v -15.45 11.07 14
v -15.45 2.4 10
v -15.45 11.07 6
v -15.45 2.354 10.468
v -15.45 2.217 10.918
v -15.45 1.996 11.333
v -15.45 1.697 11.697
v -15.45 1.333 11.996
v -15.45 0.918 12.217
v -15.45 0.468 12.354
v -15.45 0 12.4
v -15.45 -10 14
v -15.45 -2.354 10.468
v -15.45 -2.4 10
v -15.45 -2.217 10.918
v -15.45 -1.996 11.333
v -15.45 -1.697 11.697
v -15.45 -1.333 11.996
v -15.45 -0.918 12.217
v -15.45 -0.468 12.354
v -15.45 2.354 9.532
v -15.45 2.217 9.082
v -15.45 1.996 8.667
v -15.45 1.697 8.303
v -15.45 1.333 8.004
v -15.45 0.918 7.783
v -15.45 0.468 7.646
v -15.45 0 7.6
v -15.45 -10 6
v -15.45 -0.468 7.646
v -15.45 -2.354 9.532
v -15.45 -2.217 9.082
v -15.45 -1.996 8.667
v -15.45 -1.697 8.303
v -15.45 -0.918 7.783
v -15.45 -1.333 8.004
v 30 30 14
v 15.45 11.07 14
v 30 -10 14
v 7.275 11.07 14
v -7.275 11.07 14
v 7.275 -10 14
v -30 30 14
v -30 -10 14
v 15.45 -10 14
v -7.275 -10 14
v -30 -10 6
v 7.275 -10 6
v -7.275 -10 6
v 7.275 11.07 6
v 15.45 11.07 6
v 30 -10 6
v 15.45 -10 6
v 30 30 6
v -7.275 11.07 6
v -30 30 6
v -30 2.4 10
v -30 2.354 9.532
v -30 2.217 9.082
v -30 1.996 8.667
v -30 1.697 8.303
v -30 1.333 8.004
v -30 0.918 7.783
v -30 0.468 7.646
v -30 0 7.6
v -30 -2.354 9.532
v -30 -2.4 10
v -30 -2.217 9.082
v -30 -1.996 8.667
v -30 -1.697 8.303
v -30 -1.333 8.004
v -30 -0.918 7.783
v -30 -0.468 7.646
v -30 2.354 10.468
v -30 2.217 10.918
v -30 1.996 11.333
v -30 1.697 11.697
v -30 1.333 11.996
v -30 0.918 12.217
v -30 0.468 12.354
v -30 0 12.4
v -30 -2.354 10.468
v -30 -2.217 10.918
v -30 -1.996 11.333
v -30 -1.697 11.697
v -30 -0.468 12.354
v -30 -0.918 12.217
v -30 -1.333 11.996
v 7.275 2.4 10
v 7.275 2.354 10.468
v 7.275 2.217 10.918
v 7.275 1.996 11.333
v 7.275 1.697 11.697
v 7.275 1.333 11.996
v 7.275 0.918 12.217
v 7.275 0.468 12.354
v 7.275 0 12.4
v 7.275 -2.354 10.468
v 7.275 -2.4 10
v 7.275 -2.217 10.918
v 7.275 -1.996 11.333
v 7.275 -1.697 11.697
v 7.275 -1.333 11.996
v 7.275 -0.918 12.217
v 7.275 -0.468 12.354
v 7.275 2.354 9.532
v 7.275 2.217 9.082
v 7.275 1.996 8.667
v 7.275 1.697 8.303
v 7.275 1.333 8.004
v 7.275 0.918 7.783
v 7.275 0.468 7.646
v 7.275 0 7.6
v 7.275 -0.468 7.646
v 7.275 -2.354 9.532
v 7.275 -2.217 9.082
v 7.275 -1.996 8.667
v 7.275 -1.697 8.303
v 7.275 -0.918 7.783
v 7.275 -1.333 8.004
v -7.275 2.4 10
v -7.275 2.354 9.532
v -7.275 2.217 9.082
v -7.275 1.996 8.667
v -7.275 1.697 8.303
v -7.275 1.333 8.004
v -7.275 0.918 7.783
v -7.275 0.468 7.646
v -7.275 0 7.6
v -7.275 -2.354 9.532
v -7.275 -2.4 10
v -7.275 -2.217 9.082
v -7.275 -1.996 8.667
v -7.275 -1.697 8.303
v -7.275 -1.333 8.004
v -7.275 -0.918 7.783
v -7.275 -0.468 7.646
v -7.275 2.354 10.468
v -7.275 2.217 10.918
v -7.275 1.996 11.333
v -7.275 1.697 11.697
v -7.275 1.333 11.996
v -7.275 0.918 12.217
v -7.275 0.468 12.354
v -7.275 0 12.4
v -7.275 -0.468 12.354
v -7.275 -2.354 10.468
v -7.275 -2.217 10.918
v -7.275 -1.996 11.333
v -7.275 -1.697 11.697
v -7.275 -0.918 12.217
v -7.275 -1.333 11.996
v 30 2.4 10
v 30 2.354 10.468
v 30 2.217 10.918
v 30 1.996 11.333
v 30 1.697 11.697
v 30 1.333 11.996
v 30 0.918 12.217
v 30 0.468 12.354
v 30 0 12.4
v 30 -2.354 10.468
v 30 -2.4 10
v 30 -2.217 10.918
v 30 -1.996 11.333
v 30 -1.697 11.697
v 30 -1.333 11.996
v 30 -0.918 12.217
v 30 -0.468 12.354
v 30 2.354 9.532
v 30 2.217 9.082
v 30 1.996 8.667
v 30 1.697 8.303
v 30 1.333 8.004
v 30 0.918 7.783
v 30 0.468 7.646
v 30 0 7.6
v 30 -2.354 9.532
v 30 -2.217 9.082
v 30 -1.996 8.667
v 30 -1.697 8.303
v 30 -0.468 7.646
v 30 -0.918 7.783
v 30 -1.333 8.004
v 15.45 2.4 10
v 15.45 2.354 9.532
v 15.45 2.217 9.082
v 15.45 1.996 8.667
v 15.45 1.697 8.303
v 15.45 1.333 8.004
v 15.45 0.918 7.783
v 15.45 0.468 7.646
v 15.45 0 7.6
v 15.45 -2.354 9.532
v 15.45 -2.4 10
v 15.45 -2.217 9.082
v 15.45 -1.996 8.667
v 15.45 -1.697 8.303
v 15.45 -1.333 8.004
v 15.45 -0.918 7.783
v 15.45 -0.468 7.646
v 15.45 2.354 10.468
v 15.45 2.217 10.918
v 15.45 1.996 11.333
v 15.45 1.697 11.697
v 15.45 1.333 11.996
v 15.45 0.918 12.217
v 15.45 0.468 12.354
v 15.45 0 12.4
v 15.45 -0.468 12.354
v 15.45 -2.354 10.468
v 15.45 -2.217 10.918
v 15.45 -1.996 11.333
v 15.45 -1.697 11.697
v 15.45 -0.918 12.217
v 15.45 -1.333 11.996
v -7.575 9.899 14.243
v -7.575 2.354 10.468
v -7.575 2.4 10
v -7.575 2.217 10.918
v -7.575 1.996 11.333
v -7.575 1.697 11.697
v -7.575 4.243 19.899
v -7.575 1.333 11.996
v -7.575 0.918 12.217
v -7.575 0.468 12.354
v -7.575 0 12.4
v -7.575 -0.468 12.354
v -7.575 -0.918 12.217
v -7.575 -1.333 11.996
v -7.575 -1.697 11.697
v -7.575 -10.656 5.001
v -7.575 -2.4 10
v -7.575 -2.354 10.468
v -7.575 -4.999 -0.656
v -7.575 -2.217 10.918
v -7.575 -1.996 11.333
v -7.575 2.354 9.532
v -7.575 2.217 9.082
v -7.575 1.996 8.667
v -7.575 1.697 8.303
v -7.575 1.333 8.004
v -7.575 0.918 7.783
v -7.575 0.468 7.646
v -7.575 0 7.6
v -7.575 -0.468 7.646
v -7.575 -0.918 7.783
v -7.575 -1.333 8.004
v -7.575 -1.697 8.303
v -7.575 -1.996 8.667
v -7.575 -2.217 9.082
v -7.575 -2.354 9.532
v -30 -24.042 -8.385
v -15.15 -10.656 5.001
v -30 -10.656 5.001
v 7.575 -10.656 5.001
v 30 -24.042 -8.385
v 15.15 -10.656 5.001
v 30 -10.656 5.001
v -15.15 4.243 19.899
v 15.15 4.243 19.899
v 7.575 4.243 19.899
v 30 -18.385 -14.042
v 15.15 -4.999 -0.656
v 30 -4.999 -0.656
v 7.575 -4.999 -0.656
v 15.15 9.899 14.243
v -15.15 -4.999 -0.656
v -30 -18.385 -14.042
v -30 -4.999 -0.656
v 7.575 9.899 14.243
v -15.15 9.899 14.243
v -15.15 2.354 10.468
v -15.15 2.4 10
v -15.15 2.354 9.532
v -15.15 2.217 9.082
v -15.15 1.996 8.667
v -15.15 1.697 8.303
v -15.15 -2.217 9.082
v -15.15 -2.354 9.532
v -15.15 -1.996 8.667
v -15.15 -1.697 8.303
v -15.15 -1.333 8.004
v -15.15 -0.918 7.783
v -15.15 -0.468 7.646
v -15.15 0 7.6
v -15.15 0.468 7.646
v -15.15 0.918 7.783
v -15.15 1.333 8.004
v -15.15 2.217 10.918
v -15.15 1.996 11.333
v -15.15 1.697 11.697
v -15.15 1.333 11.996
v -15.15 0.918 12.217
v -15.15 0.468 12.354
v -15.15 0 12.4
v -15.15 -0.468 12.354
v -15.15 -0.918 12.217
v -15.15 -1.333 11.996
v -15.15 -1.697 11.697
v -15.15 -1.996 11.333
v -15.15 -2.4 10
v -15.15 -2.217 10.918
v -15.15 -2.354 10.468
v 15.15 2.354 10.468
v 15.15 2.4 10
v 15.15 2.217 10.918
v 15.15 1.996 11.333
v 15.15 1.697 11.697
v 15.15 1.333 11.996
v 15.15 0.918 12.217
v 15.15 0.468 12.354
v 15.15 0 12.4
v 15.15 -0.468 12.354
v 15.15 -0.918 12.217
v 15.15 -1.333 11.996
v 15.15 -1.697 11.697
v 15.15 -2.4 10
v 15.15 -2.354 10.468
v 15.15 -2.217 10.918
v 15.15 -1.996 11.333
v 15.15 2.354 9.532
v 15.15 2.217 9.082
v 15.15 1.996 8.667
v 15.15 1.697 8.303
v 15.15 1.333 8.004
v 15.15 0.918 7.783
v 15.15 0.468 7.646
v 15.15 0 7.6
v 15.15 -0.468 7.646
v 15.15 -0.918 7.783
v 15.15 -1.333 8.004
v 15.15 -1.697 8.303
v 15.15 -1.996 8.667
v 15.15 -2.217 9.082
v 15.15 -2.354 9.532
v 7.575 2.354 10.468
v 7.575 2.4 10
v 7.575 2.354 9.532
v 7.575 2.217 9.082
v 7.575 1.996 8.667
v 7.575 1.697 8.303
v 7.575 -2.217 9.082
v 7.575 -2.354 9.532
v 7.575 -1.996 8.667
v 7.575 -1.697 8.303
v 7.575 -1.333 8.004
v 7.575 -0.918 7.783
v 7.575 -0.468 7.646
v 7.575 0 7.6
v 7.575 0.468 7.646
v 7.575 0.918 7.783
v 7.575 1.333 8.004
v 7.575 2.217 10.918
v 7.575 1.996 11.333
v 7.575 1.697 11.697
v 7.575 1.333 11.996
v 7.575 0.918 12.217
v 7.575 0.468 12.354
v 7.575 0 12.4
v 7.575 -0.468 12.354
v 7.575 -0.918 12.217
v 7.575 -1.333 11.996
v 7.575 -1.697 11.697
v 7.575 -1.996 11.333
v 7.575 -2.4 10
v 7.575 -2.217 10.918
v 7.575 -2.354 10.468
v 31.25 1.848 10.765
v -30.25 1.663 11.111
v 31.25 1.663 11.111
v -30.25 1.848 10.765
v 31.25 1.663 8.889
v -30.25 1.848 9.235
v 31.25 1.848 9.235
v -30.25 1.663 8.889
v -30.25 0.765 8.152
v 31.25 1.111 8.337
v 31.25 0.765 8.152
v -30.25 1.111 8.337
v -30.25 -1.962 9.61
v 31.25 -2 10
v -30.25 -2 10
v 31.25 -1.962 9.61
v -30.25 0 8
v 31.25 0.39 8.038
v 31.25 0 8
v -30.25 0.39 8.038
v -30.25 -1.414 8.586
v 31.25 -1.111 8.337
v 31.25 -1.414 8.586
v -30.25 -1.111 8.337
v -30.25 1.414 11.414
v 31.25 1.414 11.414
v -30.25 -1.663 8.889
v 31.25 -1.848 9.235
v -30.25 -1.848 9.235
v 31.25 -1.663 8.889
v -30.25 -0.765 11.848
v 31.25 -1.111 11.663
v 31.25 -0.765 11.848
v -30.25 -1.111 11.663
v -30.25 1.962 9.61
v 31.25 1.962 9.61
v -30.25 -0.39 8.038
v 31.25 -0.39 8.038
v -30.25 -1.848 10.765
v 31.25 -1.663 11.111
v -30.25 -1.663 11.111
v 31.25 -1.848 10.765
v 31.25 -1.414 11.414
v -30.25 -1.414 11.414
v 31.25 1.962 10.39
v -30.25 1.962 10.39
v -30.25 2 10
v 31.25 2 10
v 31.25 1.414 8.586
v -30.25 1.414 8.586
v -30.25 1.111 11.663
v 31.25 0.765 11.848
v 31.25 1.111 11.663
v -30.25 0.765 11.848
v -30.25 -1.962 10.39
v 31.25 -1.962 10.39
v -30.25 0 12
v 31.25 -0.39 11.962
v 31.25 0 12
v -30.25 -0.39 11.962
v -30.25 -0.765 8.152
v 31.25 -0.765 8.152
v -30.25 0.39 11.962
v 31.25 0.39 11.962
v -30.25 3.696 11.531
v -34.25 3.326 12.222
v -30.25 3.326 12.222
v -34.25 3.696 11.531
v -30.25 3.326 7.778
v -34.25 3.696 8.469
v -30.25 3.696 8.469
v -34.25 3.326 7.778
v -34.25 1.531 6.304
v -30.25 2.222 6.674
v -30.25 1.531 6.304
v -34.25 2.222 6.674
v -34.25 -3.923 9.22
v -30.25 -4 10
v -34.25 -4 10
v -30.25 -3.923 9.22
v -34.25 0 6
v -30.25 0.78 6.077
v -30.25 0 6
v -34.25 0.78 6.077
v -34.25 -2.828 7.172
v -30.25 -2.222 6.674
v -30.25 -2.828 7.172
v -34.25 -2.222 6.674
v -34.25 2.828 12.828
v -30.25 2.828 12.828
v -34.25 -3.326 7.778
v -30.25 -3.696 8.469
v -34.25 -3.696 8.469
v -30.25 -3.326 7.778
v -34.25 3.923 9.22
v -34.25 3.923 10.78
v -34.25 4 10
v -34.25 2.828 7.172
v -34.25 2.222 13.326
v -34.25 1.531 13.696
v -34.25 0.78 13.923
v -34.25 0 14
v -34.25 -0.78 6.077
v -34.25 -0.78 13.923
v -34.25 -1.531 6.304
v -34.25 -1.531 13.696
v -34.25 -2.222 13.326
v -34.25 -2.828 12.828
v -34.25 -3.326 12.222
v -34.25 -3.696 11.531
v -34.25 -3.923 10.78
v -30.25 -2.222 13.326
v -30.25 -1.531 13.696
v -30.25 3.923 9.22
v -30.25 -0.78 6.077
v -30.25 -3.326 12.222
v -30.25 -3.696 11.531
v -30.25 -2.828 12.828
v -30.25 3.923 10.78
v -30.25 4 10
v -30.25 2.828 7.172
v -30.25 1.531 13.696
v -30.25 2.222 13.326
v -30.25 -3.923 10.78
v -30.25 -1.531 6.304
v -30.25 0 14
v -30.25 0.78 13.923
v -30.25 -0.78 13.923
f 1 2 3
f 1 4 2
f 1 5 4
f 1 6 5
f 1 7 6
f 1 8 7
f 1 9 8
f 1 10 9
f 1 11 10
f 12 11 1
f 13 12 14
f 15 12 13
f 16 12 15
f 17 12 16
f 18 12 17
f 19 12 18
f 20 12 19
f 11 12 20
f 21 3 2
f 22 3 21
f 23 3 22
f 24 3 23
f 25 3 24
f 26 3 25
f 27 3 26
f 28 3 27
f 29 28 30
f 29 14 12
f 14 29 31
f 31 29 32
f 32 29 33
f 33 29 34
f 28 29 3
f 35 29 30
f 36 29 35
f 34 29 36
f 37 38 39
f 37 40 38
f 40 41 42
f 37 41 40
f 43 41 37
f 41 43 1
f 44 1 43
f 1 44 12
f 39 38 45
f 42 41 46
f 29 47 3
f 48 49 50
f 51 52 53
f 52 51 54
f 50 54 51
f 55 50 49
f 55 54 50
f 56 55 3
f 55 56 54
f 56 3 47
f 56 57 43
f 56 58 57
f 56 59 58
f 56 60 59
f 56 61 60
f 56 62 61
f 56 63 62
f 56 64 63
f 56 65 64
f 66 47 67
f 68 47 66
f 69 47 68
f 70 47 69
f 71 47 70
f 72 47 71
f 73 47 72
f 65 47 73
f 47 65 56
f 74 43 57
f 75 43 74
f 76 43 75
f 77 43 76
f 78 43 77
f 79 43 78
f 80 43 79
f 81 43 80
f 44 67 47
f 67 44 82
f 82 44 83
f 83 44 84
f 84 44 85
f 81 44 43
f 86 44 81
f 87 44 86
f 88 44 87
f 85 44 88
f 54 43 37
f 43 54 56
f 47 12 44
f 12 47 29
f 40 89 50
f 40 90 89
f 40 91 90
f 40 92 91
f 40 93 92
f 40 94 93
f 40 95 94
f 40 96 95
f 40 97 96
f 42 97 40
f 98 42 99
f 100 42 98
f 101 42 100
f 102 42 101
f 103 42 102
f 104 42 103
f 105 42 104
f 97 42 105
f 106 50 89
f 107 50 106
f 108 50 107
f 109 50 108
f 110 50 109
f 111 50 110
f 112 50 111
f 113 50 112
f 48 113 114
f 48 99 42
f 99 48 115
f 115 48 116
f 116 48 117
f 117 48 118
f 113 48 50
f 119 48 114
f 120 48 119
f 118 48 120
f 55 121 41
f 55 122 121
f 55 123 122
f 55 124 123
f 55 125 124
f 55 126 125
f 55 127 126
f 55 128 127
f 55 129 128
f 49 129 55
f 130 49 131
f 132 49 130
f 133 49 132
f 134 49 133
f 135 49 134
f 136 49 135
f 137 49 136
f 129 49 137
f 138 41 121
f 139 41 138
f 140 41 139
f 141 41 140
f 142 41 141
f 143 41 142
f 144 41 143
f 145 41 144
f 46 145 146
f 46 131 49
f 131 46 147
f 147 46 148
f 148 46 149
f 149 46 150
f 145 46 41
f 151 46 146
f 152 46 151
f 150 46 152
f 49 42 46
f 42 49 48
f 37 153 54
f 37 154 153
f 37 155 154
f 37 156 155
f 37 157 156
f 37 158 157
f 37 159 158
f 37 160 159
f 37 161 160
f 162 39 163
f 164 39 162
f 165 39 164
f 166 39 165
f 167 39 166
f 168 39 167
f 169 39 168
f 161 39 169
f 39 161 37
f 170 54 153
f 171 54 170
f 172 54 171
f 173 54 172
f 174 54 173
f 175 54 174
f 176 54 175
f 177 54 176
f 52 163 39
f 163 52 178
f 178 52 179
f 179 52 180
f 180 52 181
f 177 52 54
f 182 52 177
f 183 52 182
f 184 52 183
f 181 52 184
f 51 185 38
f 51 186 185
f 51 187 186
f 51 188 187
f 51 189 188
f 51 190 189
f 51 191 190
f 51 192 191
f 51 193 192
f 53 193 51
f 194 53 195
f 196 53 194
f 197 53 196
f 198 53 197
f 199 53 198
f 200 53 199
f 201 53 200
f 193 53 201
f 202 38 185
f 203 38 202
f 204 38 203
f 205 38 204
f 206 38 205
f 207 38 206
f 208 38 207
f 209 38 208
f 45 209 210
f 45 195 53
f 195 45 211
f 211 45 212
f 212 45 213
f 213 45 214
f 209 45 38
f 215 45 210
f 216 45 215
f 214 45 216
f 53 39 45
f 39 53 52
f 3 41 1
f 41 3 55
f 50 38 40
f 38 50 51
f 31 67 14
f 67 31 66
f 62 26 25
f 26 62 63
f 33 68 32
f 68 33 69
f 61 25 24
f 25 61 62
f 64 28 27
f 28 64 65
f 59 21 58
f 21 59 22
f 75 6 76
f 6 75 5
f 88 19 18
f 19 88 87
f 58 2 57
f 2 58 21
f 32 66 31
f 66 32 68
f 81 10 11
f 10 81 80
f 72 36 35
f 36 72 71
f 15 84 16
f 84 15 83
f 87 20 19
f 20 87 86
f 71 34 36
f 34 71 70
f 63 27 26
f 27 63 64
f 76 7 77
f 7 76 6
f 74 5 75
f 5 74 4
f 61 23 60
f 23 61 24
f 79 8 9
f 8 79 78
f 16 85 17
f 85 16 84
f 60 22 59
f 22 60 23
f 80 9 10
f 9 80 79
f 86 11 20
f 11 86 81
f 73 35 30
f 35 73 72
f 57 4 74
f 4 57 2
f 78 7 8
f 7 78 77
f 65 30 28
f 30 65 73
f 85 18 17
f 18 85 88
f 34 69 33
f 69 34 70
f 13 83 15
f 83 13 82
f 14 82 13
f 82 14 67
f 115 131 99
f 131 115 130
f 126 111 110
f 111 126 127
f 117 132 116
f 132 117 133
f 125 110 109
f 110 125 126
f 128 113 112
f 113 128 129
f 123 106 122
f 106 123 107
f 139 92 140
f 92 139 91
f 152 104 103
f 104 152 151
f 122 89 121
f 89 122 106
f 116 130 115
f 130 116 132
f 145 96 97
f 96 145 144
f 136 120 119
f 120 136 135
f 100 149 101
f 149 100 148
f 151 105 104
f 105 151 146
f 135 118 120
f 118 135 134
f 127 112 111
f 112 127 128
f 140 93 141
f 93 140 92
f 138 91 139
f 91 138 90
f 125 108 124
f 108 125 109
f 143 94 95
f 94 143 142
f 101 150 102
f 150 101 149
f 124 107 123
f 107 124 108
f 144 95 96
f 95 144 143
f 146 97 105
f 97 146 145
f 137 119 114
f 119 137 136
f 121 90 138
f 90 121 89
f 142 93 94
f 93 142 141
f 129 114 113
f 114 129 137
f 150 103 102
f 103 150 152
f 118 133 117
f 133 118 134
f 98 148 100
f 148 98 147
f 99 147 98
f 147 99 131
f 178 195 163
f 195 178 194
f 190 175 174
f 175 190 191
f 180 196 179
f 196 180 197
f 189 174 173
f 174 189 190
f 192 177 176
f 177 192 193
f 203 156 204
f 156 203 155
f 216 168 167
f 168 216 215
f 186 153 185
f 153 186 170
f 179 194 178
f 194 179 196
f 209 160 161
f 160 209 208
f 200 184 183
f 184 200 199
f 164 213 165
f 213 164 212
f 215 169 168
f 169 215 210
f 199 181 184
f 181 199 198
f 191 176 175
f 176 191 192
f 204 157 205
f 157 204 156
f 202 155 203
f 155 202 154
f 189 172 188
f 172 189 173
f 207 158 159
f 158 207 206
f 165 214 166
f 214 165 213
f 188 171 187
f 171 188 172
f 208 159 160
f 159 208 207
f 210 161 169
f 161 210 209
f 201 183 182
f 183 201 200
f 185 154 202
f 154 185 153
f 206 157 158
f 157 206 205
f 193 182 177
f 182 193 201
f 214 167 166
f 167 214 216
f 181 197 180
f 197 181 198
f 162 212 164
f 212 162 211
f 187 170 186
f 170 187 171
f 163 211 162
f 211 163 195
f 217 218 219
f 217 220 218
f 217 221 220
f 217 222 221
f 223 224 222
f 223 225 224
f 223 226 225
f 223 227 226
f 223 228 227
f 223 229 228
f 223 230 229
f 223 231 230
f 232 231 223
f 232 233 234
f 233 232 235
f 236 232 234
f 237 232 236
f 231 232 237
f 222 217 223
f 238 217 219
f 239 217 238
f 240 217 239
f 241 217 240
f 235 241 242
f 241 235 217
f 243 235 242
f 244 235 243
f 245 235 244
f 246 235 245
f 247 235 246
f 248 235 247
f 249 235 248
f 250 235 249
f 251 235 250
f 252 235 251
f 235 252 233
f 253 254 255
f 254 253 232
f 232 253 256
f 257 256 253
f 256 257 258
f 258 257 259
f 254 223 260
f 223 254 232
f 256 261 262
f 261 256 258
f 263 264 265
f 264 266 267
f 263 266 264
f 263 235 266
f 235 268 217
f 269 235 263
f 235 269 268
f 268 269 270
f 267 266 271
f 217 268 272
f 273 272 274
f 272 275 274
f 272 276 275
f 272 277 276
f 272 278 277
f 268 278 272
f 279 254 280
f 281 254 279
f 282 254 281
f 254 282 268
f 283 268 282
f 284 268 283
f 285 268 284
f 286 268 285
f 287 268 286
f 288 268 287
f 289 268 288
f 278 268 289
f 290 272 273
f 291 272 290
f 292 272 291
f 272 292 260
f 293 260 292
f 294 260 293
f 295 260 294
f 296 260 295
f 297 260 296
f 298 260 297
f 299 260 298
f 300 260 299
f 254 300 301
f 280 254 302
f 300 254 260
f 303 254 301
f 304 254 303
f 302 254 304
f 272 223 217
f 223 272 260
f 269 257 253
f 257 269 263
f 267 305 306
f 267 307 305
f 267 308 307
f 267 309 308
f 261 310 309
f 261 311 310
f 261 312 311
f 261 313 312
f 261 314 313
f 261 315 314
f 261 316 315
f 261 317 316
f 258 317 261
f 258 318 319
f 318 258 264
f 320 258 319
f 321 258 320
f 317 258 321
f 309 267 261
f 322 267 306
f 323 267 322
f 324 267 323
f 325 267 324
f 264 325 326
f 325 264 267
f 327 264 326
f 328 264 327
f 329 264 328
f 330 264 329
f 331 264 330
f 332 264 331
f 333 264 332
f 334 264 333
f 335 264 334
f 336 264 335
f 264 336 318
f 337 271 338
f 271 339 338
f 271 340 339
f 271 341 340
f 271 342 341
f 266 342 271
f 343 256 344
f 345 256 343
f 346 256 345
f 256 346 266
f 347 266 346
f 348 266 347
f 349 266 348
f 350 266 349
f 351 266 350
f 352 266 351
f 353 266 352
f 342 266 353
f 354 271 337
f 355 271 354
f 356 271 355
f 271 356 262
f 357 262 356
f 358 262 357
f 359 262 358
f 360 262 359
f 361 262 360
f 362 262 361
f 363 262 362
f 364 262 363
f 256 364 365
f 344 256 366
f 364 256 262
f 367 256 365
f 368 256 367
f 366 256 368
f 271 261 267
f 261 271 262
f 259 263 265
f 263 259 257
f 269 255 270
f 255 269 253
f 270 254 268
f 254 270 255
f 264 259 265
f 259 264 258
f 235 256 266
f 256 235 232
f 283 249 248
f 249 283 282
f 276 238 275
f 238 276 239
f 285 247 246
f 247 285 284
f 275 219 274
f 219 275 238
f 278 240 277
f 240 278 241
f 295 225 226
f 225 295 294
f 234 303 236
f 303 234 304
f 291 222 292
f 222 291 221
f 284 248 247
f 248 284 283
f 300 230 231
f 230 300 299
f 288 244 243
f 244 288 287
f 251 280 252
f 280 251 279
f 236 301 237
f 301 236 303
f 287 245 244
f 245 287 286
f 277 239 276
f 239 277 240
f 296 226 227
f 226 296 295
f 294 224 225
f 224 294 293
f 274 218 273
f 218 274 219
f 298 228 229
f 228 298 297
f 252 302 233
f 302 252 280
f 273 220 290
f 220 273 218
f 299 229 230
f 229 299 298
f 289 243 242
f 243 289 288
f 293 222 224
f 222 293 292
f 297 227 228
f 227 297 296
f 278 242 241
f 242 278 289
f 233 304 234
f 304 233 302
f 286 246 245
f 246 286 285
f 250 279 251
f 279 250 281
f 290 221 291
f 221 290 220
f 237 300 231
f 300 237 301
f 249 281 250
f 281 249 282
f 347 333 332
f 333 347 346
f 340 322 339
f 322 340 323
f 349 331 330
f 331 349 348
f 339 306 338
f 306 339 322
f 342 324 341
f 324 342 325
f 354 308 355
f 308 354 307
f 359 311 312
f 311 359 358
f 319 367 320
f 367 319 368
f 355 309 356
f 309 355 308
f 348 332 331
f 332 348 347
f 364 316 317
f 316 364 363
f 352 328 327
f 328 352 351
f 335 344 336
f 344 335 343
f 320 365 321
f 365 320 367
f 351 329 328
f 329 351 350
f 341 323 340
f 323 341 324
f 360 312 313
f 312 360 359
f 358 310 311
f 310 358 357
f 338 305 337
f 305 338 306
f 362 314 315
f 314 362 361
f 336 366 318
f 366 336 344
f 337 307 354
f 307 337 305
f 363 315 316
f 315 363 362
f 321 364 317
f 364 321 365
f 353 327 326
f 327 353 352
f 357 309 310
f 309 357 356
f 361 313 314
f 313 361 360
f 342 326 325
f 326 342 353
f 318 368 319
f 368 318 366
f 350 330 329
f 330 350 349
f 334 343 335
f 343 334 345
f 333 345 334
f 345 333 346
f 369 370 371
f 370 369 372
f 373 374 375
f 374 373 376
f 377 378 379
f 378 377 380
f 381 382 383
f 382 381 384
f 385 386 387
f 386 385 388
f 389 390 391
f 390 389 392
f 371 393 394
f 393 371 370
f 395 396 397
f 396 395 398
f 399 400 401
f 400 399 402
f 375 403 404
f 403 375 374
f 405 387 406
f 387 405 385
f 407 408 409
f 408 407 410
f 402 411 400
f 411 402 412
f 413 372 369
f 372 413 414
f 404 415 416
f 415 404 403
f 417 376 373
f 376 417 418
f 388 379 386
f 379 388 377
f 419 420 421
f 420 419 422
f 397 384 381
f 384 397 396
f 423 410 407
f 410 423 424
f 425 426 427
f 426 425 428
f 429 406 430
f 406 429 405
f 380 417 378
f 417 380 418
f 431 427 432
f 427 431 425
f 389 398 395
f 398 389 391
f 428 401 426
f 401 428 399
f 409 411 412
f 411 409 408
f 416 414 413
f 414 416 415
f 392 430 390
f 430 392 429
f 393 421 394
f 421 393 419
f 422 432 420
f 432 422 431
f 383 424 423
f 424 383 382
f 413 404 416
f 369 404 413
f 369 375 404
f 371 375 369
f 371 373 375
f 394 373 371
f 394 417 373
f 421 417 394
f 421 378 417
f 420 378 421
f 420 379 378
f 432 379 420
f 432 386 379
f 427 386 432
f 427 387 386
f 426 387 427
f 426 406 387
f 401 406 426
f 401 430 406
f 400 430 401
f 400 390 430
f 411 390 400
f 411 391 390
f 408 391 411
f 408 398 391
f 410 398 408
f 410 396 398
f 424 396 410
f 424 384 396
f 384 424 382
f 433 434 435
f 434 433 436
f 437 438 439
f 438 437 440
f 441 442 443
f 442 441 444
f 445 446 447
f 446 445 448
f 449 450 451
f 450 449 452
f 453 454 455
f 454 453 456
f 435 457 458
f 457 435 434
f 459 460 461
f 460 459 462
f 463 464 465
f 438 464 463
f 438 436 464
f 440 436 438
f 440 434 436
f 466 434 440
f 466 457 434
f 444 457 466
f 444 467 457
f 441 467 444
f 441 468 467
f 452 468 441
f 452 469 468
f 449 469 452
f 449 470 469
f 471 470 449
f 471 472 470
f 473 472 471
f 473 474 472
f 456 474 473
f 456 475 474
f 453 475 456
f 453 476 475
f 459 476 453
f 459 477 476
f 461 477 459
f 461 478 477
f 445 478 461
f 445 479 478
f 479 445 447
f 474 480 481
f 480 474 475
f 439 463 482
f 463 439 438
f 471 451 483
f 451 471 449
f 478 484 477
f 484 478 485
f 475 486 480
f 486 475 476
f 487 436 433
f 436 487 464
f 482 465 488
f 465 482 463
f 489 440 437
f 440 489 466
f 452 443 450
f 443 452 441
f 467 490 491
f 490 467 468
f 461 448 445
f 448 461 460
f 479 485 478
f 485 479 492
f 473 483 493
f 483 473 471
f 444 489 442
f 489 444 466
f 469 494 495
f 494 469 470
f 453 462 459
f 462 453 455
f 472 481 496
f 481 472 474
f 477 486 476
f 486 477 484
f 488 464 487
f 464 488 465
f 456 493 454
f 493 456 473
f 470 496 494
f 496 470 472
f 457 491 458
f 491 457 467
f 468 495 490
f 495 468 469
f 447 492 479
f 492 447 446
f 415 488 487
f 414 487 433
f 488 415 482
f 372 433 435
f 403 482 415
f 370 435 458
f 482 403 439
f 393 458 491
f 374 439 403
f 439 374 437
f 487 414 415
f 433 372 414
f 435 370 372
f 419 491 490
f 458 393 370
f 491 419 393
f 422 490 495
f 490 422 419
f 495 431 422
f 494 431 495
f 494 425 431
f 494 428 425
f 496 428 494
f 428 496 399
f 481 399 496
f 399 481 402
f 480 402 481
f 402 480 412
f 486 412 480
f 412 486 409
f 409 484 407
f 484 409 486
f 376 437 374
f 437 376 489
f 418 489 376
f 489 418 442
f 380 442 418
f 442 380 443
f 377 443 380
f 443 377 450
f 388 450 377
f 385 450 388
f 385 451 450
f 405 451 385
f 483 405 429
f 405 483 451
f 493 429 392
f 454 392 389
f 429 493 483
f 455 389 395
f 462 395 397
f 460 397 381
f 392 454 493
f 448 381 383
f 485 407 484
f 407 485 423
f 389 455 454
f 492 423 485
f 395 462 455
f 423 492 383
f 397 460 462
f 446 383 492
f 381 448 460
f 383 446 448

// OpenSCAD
$fn = 32;

// ------------------------------------------------------------------------
// Butt hinge: hinge 60 mm, leaf swung 45 deg
// Every part is its own module, assembly() places every instance.
// ------------------------------------------------------------------------

// --- part 1 ---
module hinge_base() {
  difference() {
    union() {
      translate([-30, -10, -4]) cube([14.55, 40, 8]);
      translate([-7.275, -10, -4]) cube([14.55, 40, 8]);
      translate([15.45, -10, -4]) cube([14.55, 40, 8]);
      translate([-30, 11.07, -4]) cube([60, 18.93, 8]);
    }
    translate([-22.725, 0, 0]) rotate([0, 90, 0]) cylinder(h = 16.55, d = 4.8, center = true);
    translate([0, 0, 0]) rotate([0, 90, 0]) cylinder(h = 16.55, d = 4.8, center = true);
    translate([22.725, 0, 0]) rotate([0, 90, 0]) cylinder(h = 16.55, d = 4.8, center = true);
  }
}

// --- part 2 ---
module hinge_mover() {
  difference() {
    union() {
      translate([-15.15, -30, -4]) cube([7.575, 40, 8]);
      translate([7.575, -30, -4]) cube([7.575, 40, 8]);
      translate([-30, -30, -4]) cube([60, 18.93, 8]);
    }
    translate([-11.362, 0, 0]) rotate([0, 90, 0]) cylinder(h = 9.575, d = 4.8, center = true);
    translate([11.362, 0, 0]) rotate([0, 90, 0]) cylinder(h = 9.575, d = 4.8, center = true);
  }
}

// --- part 3 ---
module hinge_pin() {
  rotate([0, 90, 0]) cylinder(h = 62.5, d = 4, center = true);
  translate([-34.25, 0, 0]) rotate([0, 90, 0]) cylinder(h = 4, d = 8);
}

// --- assembly ---
module assembly() {
  color([0.80, 0.24, 0.20]) translate([0, 0, 10]) rotate([0, 0, 0]) hinge_base();
  color([0.20, 0.45, 0.75]) translate([0, 0, 10]) rotate([45, 0, 0]) hinge_mover();
  color([0.25, 0.62, 0.32]) translate([0, 0, 10]) rotate([0, 0, 0]) hinge_pin();
}

assembly();
